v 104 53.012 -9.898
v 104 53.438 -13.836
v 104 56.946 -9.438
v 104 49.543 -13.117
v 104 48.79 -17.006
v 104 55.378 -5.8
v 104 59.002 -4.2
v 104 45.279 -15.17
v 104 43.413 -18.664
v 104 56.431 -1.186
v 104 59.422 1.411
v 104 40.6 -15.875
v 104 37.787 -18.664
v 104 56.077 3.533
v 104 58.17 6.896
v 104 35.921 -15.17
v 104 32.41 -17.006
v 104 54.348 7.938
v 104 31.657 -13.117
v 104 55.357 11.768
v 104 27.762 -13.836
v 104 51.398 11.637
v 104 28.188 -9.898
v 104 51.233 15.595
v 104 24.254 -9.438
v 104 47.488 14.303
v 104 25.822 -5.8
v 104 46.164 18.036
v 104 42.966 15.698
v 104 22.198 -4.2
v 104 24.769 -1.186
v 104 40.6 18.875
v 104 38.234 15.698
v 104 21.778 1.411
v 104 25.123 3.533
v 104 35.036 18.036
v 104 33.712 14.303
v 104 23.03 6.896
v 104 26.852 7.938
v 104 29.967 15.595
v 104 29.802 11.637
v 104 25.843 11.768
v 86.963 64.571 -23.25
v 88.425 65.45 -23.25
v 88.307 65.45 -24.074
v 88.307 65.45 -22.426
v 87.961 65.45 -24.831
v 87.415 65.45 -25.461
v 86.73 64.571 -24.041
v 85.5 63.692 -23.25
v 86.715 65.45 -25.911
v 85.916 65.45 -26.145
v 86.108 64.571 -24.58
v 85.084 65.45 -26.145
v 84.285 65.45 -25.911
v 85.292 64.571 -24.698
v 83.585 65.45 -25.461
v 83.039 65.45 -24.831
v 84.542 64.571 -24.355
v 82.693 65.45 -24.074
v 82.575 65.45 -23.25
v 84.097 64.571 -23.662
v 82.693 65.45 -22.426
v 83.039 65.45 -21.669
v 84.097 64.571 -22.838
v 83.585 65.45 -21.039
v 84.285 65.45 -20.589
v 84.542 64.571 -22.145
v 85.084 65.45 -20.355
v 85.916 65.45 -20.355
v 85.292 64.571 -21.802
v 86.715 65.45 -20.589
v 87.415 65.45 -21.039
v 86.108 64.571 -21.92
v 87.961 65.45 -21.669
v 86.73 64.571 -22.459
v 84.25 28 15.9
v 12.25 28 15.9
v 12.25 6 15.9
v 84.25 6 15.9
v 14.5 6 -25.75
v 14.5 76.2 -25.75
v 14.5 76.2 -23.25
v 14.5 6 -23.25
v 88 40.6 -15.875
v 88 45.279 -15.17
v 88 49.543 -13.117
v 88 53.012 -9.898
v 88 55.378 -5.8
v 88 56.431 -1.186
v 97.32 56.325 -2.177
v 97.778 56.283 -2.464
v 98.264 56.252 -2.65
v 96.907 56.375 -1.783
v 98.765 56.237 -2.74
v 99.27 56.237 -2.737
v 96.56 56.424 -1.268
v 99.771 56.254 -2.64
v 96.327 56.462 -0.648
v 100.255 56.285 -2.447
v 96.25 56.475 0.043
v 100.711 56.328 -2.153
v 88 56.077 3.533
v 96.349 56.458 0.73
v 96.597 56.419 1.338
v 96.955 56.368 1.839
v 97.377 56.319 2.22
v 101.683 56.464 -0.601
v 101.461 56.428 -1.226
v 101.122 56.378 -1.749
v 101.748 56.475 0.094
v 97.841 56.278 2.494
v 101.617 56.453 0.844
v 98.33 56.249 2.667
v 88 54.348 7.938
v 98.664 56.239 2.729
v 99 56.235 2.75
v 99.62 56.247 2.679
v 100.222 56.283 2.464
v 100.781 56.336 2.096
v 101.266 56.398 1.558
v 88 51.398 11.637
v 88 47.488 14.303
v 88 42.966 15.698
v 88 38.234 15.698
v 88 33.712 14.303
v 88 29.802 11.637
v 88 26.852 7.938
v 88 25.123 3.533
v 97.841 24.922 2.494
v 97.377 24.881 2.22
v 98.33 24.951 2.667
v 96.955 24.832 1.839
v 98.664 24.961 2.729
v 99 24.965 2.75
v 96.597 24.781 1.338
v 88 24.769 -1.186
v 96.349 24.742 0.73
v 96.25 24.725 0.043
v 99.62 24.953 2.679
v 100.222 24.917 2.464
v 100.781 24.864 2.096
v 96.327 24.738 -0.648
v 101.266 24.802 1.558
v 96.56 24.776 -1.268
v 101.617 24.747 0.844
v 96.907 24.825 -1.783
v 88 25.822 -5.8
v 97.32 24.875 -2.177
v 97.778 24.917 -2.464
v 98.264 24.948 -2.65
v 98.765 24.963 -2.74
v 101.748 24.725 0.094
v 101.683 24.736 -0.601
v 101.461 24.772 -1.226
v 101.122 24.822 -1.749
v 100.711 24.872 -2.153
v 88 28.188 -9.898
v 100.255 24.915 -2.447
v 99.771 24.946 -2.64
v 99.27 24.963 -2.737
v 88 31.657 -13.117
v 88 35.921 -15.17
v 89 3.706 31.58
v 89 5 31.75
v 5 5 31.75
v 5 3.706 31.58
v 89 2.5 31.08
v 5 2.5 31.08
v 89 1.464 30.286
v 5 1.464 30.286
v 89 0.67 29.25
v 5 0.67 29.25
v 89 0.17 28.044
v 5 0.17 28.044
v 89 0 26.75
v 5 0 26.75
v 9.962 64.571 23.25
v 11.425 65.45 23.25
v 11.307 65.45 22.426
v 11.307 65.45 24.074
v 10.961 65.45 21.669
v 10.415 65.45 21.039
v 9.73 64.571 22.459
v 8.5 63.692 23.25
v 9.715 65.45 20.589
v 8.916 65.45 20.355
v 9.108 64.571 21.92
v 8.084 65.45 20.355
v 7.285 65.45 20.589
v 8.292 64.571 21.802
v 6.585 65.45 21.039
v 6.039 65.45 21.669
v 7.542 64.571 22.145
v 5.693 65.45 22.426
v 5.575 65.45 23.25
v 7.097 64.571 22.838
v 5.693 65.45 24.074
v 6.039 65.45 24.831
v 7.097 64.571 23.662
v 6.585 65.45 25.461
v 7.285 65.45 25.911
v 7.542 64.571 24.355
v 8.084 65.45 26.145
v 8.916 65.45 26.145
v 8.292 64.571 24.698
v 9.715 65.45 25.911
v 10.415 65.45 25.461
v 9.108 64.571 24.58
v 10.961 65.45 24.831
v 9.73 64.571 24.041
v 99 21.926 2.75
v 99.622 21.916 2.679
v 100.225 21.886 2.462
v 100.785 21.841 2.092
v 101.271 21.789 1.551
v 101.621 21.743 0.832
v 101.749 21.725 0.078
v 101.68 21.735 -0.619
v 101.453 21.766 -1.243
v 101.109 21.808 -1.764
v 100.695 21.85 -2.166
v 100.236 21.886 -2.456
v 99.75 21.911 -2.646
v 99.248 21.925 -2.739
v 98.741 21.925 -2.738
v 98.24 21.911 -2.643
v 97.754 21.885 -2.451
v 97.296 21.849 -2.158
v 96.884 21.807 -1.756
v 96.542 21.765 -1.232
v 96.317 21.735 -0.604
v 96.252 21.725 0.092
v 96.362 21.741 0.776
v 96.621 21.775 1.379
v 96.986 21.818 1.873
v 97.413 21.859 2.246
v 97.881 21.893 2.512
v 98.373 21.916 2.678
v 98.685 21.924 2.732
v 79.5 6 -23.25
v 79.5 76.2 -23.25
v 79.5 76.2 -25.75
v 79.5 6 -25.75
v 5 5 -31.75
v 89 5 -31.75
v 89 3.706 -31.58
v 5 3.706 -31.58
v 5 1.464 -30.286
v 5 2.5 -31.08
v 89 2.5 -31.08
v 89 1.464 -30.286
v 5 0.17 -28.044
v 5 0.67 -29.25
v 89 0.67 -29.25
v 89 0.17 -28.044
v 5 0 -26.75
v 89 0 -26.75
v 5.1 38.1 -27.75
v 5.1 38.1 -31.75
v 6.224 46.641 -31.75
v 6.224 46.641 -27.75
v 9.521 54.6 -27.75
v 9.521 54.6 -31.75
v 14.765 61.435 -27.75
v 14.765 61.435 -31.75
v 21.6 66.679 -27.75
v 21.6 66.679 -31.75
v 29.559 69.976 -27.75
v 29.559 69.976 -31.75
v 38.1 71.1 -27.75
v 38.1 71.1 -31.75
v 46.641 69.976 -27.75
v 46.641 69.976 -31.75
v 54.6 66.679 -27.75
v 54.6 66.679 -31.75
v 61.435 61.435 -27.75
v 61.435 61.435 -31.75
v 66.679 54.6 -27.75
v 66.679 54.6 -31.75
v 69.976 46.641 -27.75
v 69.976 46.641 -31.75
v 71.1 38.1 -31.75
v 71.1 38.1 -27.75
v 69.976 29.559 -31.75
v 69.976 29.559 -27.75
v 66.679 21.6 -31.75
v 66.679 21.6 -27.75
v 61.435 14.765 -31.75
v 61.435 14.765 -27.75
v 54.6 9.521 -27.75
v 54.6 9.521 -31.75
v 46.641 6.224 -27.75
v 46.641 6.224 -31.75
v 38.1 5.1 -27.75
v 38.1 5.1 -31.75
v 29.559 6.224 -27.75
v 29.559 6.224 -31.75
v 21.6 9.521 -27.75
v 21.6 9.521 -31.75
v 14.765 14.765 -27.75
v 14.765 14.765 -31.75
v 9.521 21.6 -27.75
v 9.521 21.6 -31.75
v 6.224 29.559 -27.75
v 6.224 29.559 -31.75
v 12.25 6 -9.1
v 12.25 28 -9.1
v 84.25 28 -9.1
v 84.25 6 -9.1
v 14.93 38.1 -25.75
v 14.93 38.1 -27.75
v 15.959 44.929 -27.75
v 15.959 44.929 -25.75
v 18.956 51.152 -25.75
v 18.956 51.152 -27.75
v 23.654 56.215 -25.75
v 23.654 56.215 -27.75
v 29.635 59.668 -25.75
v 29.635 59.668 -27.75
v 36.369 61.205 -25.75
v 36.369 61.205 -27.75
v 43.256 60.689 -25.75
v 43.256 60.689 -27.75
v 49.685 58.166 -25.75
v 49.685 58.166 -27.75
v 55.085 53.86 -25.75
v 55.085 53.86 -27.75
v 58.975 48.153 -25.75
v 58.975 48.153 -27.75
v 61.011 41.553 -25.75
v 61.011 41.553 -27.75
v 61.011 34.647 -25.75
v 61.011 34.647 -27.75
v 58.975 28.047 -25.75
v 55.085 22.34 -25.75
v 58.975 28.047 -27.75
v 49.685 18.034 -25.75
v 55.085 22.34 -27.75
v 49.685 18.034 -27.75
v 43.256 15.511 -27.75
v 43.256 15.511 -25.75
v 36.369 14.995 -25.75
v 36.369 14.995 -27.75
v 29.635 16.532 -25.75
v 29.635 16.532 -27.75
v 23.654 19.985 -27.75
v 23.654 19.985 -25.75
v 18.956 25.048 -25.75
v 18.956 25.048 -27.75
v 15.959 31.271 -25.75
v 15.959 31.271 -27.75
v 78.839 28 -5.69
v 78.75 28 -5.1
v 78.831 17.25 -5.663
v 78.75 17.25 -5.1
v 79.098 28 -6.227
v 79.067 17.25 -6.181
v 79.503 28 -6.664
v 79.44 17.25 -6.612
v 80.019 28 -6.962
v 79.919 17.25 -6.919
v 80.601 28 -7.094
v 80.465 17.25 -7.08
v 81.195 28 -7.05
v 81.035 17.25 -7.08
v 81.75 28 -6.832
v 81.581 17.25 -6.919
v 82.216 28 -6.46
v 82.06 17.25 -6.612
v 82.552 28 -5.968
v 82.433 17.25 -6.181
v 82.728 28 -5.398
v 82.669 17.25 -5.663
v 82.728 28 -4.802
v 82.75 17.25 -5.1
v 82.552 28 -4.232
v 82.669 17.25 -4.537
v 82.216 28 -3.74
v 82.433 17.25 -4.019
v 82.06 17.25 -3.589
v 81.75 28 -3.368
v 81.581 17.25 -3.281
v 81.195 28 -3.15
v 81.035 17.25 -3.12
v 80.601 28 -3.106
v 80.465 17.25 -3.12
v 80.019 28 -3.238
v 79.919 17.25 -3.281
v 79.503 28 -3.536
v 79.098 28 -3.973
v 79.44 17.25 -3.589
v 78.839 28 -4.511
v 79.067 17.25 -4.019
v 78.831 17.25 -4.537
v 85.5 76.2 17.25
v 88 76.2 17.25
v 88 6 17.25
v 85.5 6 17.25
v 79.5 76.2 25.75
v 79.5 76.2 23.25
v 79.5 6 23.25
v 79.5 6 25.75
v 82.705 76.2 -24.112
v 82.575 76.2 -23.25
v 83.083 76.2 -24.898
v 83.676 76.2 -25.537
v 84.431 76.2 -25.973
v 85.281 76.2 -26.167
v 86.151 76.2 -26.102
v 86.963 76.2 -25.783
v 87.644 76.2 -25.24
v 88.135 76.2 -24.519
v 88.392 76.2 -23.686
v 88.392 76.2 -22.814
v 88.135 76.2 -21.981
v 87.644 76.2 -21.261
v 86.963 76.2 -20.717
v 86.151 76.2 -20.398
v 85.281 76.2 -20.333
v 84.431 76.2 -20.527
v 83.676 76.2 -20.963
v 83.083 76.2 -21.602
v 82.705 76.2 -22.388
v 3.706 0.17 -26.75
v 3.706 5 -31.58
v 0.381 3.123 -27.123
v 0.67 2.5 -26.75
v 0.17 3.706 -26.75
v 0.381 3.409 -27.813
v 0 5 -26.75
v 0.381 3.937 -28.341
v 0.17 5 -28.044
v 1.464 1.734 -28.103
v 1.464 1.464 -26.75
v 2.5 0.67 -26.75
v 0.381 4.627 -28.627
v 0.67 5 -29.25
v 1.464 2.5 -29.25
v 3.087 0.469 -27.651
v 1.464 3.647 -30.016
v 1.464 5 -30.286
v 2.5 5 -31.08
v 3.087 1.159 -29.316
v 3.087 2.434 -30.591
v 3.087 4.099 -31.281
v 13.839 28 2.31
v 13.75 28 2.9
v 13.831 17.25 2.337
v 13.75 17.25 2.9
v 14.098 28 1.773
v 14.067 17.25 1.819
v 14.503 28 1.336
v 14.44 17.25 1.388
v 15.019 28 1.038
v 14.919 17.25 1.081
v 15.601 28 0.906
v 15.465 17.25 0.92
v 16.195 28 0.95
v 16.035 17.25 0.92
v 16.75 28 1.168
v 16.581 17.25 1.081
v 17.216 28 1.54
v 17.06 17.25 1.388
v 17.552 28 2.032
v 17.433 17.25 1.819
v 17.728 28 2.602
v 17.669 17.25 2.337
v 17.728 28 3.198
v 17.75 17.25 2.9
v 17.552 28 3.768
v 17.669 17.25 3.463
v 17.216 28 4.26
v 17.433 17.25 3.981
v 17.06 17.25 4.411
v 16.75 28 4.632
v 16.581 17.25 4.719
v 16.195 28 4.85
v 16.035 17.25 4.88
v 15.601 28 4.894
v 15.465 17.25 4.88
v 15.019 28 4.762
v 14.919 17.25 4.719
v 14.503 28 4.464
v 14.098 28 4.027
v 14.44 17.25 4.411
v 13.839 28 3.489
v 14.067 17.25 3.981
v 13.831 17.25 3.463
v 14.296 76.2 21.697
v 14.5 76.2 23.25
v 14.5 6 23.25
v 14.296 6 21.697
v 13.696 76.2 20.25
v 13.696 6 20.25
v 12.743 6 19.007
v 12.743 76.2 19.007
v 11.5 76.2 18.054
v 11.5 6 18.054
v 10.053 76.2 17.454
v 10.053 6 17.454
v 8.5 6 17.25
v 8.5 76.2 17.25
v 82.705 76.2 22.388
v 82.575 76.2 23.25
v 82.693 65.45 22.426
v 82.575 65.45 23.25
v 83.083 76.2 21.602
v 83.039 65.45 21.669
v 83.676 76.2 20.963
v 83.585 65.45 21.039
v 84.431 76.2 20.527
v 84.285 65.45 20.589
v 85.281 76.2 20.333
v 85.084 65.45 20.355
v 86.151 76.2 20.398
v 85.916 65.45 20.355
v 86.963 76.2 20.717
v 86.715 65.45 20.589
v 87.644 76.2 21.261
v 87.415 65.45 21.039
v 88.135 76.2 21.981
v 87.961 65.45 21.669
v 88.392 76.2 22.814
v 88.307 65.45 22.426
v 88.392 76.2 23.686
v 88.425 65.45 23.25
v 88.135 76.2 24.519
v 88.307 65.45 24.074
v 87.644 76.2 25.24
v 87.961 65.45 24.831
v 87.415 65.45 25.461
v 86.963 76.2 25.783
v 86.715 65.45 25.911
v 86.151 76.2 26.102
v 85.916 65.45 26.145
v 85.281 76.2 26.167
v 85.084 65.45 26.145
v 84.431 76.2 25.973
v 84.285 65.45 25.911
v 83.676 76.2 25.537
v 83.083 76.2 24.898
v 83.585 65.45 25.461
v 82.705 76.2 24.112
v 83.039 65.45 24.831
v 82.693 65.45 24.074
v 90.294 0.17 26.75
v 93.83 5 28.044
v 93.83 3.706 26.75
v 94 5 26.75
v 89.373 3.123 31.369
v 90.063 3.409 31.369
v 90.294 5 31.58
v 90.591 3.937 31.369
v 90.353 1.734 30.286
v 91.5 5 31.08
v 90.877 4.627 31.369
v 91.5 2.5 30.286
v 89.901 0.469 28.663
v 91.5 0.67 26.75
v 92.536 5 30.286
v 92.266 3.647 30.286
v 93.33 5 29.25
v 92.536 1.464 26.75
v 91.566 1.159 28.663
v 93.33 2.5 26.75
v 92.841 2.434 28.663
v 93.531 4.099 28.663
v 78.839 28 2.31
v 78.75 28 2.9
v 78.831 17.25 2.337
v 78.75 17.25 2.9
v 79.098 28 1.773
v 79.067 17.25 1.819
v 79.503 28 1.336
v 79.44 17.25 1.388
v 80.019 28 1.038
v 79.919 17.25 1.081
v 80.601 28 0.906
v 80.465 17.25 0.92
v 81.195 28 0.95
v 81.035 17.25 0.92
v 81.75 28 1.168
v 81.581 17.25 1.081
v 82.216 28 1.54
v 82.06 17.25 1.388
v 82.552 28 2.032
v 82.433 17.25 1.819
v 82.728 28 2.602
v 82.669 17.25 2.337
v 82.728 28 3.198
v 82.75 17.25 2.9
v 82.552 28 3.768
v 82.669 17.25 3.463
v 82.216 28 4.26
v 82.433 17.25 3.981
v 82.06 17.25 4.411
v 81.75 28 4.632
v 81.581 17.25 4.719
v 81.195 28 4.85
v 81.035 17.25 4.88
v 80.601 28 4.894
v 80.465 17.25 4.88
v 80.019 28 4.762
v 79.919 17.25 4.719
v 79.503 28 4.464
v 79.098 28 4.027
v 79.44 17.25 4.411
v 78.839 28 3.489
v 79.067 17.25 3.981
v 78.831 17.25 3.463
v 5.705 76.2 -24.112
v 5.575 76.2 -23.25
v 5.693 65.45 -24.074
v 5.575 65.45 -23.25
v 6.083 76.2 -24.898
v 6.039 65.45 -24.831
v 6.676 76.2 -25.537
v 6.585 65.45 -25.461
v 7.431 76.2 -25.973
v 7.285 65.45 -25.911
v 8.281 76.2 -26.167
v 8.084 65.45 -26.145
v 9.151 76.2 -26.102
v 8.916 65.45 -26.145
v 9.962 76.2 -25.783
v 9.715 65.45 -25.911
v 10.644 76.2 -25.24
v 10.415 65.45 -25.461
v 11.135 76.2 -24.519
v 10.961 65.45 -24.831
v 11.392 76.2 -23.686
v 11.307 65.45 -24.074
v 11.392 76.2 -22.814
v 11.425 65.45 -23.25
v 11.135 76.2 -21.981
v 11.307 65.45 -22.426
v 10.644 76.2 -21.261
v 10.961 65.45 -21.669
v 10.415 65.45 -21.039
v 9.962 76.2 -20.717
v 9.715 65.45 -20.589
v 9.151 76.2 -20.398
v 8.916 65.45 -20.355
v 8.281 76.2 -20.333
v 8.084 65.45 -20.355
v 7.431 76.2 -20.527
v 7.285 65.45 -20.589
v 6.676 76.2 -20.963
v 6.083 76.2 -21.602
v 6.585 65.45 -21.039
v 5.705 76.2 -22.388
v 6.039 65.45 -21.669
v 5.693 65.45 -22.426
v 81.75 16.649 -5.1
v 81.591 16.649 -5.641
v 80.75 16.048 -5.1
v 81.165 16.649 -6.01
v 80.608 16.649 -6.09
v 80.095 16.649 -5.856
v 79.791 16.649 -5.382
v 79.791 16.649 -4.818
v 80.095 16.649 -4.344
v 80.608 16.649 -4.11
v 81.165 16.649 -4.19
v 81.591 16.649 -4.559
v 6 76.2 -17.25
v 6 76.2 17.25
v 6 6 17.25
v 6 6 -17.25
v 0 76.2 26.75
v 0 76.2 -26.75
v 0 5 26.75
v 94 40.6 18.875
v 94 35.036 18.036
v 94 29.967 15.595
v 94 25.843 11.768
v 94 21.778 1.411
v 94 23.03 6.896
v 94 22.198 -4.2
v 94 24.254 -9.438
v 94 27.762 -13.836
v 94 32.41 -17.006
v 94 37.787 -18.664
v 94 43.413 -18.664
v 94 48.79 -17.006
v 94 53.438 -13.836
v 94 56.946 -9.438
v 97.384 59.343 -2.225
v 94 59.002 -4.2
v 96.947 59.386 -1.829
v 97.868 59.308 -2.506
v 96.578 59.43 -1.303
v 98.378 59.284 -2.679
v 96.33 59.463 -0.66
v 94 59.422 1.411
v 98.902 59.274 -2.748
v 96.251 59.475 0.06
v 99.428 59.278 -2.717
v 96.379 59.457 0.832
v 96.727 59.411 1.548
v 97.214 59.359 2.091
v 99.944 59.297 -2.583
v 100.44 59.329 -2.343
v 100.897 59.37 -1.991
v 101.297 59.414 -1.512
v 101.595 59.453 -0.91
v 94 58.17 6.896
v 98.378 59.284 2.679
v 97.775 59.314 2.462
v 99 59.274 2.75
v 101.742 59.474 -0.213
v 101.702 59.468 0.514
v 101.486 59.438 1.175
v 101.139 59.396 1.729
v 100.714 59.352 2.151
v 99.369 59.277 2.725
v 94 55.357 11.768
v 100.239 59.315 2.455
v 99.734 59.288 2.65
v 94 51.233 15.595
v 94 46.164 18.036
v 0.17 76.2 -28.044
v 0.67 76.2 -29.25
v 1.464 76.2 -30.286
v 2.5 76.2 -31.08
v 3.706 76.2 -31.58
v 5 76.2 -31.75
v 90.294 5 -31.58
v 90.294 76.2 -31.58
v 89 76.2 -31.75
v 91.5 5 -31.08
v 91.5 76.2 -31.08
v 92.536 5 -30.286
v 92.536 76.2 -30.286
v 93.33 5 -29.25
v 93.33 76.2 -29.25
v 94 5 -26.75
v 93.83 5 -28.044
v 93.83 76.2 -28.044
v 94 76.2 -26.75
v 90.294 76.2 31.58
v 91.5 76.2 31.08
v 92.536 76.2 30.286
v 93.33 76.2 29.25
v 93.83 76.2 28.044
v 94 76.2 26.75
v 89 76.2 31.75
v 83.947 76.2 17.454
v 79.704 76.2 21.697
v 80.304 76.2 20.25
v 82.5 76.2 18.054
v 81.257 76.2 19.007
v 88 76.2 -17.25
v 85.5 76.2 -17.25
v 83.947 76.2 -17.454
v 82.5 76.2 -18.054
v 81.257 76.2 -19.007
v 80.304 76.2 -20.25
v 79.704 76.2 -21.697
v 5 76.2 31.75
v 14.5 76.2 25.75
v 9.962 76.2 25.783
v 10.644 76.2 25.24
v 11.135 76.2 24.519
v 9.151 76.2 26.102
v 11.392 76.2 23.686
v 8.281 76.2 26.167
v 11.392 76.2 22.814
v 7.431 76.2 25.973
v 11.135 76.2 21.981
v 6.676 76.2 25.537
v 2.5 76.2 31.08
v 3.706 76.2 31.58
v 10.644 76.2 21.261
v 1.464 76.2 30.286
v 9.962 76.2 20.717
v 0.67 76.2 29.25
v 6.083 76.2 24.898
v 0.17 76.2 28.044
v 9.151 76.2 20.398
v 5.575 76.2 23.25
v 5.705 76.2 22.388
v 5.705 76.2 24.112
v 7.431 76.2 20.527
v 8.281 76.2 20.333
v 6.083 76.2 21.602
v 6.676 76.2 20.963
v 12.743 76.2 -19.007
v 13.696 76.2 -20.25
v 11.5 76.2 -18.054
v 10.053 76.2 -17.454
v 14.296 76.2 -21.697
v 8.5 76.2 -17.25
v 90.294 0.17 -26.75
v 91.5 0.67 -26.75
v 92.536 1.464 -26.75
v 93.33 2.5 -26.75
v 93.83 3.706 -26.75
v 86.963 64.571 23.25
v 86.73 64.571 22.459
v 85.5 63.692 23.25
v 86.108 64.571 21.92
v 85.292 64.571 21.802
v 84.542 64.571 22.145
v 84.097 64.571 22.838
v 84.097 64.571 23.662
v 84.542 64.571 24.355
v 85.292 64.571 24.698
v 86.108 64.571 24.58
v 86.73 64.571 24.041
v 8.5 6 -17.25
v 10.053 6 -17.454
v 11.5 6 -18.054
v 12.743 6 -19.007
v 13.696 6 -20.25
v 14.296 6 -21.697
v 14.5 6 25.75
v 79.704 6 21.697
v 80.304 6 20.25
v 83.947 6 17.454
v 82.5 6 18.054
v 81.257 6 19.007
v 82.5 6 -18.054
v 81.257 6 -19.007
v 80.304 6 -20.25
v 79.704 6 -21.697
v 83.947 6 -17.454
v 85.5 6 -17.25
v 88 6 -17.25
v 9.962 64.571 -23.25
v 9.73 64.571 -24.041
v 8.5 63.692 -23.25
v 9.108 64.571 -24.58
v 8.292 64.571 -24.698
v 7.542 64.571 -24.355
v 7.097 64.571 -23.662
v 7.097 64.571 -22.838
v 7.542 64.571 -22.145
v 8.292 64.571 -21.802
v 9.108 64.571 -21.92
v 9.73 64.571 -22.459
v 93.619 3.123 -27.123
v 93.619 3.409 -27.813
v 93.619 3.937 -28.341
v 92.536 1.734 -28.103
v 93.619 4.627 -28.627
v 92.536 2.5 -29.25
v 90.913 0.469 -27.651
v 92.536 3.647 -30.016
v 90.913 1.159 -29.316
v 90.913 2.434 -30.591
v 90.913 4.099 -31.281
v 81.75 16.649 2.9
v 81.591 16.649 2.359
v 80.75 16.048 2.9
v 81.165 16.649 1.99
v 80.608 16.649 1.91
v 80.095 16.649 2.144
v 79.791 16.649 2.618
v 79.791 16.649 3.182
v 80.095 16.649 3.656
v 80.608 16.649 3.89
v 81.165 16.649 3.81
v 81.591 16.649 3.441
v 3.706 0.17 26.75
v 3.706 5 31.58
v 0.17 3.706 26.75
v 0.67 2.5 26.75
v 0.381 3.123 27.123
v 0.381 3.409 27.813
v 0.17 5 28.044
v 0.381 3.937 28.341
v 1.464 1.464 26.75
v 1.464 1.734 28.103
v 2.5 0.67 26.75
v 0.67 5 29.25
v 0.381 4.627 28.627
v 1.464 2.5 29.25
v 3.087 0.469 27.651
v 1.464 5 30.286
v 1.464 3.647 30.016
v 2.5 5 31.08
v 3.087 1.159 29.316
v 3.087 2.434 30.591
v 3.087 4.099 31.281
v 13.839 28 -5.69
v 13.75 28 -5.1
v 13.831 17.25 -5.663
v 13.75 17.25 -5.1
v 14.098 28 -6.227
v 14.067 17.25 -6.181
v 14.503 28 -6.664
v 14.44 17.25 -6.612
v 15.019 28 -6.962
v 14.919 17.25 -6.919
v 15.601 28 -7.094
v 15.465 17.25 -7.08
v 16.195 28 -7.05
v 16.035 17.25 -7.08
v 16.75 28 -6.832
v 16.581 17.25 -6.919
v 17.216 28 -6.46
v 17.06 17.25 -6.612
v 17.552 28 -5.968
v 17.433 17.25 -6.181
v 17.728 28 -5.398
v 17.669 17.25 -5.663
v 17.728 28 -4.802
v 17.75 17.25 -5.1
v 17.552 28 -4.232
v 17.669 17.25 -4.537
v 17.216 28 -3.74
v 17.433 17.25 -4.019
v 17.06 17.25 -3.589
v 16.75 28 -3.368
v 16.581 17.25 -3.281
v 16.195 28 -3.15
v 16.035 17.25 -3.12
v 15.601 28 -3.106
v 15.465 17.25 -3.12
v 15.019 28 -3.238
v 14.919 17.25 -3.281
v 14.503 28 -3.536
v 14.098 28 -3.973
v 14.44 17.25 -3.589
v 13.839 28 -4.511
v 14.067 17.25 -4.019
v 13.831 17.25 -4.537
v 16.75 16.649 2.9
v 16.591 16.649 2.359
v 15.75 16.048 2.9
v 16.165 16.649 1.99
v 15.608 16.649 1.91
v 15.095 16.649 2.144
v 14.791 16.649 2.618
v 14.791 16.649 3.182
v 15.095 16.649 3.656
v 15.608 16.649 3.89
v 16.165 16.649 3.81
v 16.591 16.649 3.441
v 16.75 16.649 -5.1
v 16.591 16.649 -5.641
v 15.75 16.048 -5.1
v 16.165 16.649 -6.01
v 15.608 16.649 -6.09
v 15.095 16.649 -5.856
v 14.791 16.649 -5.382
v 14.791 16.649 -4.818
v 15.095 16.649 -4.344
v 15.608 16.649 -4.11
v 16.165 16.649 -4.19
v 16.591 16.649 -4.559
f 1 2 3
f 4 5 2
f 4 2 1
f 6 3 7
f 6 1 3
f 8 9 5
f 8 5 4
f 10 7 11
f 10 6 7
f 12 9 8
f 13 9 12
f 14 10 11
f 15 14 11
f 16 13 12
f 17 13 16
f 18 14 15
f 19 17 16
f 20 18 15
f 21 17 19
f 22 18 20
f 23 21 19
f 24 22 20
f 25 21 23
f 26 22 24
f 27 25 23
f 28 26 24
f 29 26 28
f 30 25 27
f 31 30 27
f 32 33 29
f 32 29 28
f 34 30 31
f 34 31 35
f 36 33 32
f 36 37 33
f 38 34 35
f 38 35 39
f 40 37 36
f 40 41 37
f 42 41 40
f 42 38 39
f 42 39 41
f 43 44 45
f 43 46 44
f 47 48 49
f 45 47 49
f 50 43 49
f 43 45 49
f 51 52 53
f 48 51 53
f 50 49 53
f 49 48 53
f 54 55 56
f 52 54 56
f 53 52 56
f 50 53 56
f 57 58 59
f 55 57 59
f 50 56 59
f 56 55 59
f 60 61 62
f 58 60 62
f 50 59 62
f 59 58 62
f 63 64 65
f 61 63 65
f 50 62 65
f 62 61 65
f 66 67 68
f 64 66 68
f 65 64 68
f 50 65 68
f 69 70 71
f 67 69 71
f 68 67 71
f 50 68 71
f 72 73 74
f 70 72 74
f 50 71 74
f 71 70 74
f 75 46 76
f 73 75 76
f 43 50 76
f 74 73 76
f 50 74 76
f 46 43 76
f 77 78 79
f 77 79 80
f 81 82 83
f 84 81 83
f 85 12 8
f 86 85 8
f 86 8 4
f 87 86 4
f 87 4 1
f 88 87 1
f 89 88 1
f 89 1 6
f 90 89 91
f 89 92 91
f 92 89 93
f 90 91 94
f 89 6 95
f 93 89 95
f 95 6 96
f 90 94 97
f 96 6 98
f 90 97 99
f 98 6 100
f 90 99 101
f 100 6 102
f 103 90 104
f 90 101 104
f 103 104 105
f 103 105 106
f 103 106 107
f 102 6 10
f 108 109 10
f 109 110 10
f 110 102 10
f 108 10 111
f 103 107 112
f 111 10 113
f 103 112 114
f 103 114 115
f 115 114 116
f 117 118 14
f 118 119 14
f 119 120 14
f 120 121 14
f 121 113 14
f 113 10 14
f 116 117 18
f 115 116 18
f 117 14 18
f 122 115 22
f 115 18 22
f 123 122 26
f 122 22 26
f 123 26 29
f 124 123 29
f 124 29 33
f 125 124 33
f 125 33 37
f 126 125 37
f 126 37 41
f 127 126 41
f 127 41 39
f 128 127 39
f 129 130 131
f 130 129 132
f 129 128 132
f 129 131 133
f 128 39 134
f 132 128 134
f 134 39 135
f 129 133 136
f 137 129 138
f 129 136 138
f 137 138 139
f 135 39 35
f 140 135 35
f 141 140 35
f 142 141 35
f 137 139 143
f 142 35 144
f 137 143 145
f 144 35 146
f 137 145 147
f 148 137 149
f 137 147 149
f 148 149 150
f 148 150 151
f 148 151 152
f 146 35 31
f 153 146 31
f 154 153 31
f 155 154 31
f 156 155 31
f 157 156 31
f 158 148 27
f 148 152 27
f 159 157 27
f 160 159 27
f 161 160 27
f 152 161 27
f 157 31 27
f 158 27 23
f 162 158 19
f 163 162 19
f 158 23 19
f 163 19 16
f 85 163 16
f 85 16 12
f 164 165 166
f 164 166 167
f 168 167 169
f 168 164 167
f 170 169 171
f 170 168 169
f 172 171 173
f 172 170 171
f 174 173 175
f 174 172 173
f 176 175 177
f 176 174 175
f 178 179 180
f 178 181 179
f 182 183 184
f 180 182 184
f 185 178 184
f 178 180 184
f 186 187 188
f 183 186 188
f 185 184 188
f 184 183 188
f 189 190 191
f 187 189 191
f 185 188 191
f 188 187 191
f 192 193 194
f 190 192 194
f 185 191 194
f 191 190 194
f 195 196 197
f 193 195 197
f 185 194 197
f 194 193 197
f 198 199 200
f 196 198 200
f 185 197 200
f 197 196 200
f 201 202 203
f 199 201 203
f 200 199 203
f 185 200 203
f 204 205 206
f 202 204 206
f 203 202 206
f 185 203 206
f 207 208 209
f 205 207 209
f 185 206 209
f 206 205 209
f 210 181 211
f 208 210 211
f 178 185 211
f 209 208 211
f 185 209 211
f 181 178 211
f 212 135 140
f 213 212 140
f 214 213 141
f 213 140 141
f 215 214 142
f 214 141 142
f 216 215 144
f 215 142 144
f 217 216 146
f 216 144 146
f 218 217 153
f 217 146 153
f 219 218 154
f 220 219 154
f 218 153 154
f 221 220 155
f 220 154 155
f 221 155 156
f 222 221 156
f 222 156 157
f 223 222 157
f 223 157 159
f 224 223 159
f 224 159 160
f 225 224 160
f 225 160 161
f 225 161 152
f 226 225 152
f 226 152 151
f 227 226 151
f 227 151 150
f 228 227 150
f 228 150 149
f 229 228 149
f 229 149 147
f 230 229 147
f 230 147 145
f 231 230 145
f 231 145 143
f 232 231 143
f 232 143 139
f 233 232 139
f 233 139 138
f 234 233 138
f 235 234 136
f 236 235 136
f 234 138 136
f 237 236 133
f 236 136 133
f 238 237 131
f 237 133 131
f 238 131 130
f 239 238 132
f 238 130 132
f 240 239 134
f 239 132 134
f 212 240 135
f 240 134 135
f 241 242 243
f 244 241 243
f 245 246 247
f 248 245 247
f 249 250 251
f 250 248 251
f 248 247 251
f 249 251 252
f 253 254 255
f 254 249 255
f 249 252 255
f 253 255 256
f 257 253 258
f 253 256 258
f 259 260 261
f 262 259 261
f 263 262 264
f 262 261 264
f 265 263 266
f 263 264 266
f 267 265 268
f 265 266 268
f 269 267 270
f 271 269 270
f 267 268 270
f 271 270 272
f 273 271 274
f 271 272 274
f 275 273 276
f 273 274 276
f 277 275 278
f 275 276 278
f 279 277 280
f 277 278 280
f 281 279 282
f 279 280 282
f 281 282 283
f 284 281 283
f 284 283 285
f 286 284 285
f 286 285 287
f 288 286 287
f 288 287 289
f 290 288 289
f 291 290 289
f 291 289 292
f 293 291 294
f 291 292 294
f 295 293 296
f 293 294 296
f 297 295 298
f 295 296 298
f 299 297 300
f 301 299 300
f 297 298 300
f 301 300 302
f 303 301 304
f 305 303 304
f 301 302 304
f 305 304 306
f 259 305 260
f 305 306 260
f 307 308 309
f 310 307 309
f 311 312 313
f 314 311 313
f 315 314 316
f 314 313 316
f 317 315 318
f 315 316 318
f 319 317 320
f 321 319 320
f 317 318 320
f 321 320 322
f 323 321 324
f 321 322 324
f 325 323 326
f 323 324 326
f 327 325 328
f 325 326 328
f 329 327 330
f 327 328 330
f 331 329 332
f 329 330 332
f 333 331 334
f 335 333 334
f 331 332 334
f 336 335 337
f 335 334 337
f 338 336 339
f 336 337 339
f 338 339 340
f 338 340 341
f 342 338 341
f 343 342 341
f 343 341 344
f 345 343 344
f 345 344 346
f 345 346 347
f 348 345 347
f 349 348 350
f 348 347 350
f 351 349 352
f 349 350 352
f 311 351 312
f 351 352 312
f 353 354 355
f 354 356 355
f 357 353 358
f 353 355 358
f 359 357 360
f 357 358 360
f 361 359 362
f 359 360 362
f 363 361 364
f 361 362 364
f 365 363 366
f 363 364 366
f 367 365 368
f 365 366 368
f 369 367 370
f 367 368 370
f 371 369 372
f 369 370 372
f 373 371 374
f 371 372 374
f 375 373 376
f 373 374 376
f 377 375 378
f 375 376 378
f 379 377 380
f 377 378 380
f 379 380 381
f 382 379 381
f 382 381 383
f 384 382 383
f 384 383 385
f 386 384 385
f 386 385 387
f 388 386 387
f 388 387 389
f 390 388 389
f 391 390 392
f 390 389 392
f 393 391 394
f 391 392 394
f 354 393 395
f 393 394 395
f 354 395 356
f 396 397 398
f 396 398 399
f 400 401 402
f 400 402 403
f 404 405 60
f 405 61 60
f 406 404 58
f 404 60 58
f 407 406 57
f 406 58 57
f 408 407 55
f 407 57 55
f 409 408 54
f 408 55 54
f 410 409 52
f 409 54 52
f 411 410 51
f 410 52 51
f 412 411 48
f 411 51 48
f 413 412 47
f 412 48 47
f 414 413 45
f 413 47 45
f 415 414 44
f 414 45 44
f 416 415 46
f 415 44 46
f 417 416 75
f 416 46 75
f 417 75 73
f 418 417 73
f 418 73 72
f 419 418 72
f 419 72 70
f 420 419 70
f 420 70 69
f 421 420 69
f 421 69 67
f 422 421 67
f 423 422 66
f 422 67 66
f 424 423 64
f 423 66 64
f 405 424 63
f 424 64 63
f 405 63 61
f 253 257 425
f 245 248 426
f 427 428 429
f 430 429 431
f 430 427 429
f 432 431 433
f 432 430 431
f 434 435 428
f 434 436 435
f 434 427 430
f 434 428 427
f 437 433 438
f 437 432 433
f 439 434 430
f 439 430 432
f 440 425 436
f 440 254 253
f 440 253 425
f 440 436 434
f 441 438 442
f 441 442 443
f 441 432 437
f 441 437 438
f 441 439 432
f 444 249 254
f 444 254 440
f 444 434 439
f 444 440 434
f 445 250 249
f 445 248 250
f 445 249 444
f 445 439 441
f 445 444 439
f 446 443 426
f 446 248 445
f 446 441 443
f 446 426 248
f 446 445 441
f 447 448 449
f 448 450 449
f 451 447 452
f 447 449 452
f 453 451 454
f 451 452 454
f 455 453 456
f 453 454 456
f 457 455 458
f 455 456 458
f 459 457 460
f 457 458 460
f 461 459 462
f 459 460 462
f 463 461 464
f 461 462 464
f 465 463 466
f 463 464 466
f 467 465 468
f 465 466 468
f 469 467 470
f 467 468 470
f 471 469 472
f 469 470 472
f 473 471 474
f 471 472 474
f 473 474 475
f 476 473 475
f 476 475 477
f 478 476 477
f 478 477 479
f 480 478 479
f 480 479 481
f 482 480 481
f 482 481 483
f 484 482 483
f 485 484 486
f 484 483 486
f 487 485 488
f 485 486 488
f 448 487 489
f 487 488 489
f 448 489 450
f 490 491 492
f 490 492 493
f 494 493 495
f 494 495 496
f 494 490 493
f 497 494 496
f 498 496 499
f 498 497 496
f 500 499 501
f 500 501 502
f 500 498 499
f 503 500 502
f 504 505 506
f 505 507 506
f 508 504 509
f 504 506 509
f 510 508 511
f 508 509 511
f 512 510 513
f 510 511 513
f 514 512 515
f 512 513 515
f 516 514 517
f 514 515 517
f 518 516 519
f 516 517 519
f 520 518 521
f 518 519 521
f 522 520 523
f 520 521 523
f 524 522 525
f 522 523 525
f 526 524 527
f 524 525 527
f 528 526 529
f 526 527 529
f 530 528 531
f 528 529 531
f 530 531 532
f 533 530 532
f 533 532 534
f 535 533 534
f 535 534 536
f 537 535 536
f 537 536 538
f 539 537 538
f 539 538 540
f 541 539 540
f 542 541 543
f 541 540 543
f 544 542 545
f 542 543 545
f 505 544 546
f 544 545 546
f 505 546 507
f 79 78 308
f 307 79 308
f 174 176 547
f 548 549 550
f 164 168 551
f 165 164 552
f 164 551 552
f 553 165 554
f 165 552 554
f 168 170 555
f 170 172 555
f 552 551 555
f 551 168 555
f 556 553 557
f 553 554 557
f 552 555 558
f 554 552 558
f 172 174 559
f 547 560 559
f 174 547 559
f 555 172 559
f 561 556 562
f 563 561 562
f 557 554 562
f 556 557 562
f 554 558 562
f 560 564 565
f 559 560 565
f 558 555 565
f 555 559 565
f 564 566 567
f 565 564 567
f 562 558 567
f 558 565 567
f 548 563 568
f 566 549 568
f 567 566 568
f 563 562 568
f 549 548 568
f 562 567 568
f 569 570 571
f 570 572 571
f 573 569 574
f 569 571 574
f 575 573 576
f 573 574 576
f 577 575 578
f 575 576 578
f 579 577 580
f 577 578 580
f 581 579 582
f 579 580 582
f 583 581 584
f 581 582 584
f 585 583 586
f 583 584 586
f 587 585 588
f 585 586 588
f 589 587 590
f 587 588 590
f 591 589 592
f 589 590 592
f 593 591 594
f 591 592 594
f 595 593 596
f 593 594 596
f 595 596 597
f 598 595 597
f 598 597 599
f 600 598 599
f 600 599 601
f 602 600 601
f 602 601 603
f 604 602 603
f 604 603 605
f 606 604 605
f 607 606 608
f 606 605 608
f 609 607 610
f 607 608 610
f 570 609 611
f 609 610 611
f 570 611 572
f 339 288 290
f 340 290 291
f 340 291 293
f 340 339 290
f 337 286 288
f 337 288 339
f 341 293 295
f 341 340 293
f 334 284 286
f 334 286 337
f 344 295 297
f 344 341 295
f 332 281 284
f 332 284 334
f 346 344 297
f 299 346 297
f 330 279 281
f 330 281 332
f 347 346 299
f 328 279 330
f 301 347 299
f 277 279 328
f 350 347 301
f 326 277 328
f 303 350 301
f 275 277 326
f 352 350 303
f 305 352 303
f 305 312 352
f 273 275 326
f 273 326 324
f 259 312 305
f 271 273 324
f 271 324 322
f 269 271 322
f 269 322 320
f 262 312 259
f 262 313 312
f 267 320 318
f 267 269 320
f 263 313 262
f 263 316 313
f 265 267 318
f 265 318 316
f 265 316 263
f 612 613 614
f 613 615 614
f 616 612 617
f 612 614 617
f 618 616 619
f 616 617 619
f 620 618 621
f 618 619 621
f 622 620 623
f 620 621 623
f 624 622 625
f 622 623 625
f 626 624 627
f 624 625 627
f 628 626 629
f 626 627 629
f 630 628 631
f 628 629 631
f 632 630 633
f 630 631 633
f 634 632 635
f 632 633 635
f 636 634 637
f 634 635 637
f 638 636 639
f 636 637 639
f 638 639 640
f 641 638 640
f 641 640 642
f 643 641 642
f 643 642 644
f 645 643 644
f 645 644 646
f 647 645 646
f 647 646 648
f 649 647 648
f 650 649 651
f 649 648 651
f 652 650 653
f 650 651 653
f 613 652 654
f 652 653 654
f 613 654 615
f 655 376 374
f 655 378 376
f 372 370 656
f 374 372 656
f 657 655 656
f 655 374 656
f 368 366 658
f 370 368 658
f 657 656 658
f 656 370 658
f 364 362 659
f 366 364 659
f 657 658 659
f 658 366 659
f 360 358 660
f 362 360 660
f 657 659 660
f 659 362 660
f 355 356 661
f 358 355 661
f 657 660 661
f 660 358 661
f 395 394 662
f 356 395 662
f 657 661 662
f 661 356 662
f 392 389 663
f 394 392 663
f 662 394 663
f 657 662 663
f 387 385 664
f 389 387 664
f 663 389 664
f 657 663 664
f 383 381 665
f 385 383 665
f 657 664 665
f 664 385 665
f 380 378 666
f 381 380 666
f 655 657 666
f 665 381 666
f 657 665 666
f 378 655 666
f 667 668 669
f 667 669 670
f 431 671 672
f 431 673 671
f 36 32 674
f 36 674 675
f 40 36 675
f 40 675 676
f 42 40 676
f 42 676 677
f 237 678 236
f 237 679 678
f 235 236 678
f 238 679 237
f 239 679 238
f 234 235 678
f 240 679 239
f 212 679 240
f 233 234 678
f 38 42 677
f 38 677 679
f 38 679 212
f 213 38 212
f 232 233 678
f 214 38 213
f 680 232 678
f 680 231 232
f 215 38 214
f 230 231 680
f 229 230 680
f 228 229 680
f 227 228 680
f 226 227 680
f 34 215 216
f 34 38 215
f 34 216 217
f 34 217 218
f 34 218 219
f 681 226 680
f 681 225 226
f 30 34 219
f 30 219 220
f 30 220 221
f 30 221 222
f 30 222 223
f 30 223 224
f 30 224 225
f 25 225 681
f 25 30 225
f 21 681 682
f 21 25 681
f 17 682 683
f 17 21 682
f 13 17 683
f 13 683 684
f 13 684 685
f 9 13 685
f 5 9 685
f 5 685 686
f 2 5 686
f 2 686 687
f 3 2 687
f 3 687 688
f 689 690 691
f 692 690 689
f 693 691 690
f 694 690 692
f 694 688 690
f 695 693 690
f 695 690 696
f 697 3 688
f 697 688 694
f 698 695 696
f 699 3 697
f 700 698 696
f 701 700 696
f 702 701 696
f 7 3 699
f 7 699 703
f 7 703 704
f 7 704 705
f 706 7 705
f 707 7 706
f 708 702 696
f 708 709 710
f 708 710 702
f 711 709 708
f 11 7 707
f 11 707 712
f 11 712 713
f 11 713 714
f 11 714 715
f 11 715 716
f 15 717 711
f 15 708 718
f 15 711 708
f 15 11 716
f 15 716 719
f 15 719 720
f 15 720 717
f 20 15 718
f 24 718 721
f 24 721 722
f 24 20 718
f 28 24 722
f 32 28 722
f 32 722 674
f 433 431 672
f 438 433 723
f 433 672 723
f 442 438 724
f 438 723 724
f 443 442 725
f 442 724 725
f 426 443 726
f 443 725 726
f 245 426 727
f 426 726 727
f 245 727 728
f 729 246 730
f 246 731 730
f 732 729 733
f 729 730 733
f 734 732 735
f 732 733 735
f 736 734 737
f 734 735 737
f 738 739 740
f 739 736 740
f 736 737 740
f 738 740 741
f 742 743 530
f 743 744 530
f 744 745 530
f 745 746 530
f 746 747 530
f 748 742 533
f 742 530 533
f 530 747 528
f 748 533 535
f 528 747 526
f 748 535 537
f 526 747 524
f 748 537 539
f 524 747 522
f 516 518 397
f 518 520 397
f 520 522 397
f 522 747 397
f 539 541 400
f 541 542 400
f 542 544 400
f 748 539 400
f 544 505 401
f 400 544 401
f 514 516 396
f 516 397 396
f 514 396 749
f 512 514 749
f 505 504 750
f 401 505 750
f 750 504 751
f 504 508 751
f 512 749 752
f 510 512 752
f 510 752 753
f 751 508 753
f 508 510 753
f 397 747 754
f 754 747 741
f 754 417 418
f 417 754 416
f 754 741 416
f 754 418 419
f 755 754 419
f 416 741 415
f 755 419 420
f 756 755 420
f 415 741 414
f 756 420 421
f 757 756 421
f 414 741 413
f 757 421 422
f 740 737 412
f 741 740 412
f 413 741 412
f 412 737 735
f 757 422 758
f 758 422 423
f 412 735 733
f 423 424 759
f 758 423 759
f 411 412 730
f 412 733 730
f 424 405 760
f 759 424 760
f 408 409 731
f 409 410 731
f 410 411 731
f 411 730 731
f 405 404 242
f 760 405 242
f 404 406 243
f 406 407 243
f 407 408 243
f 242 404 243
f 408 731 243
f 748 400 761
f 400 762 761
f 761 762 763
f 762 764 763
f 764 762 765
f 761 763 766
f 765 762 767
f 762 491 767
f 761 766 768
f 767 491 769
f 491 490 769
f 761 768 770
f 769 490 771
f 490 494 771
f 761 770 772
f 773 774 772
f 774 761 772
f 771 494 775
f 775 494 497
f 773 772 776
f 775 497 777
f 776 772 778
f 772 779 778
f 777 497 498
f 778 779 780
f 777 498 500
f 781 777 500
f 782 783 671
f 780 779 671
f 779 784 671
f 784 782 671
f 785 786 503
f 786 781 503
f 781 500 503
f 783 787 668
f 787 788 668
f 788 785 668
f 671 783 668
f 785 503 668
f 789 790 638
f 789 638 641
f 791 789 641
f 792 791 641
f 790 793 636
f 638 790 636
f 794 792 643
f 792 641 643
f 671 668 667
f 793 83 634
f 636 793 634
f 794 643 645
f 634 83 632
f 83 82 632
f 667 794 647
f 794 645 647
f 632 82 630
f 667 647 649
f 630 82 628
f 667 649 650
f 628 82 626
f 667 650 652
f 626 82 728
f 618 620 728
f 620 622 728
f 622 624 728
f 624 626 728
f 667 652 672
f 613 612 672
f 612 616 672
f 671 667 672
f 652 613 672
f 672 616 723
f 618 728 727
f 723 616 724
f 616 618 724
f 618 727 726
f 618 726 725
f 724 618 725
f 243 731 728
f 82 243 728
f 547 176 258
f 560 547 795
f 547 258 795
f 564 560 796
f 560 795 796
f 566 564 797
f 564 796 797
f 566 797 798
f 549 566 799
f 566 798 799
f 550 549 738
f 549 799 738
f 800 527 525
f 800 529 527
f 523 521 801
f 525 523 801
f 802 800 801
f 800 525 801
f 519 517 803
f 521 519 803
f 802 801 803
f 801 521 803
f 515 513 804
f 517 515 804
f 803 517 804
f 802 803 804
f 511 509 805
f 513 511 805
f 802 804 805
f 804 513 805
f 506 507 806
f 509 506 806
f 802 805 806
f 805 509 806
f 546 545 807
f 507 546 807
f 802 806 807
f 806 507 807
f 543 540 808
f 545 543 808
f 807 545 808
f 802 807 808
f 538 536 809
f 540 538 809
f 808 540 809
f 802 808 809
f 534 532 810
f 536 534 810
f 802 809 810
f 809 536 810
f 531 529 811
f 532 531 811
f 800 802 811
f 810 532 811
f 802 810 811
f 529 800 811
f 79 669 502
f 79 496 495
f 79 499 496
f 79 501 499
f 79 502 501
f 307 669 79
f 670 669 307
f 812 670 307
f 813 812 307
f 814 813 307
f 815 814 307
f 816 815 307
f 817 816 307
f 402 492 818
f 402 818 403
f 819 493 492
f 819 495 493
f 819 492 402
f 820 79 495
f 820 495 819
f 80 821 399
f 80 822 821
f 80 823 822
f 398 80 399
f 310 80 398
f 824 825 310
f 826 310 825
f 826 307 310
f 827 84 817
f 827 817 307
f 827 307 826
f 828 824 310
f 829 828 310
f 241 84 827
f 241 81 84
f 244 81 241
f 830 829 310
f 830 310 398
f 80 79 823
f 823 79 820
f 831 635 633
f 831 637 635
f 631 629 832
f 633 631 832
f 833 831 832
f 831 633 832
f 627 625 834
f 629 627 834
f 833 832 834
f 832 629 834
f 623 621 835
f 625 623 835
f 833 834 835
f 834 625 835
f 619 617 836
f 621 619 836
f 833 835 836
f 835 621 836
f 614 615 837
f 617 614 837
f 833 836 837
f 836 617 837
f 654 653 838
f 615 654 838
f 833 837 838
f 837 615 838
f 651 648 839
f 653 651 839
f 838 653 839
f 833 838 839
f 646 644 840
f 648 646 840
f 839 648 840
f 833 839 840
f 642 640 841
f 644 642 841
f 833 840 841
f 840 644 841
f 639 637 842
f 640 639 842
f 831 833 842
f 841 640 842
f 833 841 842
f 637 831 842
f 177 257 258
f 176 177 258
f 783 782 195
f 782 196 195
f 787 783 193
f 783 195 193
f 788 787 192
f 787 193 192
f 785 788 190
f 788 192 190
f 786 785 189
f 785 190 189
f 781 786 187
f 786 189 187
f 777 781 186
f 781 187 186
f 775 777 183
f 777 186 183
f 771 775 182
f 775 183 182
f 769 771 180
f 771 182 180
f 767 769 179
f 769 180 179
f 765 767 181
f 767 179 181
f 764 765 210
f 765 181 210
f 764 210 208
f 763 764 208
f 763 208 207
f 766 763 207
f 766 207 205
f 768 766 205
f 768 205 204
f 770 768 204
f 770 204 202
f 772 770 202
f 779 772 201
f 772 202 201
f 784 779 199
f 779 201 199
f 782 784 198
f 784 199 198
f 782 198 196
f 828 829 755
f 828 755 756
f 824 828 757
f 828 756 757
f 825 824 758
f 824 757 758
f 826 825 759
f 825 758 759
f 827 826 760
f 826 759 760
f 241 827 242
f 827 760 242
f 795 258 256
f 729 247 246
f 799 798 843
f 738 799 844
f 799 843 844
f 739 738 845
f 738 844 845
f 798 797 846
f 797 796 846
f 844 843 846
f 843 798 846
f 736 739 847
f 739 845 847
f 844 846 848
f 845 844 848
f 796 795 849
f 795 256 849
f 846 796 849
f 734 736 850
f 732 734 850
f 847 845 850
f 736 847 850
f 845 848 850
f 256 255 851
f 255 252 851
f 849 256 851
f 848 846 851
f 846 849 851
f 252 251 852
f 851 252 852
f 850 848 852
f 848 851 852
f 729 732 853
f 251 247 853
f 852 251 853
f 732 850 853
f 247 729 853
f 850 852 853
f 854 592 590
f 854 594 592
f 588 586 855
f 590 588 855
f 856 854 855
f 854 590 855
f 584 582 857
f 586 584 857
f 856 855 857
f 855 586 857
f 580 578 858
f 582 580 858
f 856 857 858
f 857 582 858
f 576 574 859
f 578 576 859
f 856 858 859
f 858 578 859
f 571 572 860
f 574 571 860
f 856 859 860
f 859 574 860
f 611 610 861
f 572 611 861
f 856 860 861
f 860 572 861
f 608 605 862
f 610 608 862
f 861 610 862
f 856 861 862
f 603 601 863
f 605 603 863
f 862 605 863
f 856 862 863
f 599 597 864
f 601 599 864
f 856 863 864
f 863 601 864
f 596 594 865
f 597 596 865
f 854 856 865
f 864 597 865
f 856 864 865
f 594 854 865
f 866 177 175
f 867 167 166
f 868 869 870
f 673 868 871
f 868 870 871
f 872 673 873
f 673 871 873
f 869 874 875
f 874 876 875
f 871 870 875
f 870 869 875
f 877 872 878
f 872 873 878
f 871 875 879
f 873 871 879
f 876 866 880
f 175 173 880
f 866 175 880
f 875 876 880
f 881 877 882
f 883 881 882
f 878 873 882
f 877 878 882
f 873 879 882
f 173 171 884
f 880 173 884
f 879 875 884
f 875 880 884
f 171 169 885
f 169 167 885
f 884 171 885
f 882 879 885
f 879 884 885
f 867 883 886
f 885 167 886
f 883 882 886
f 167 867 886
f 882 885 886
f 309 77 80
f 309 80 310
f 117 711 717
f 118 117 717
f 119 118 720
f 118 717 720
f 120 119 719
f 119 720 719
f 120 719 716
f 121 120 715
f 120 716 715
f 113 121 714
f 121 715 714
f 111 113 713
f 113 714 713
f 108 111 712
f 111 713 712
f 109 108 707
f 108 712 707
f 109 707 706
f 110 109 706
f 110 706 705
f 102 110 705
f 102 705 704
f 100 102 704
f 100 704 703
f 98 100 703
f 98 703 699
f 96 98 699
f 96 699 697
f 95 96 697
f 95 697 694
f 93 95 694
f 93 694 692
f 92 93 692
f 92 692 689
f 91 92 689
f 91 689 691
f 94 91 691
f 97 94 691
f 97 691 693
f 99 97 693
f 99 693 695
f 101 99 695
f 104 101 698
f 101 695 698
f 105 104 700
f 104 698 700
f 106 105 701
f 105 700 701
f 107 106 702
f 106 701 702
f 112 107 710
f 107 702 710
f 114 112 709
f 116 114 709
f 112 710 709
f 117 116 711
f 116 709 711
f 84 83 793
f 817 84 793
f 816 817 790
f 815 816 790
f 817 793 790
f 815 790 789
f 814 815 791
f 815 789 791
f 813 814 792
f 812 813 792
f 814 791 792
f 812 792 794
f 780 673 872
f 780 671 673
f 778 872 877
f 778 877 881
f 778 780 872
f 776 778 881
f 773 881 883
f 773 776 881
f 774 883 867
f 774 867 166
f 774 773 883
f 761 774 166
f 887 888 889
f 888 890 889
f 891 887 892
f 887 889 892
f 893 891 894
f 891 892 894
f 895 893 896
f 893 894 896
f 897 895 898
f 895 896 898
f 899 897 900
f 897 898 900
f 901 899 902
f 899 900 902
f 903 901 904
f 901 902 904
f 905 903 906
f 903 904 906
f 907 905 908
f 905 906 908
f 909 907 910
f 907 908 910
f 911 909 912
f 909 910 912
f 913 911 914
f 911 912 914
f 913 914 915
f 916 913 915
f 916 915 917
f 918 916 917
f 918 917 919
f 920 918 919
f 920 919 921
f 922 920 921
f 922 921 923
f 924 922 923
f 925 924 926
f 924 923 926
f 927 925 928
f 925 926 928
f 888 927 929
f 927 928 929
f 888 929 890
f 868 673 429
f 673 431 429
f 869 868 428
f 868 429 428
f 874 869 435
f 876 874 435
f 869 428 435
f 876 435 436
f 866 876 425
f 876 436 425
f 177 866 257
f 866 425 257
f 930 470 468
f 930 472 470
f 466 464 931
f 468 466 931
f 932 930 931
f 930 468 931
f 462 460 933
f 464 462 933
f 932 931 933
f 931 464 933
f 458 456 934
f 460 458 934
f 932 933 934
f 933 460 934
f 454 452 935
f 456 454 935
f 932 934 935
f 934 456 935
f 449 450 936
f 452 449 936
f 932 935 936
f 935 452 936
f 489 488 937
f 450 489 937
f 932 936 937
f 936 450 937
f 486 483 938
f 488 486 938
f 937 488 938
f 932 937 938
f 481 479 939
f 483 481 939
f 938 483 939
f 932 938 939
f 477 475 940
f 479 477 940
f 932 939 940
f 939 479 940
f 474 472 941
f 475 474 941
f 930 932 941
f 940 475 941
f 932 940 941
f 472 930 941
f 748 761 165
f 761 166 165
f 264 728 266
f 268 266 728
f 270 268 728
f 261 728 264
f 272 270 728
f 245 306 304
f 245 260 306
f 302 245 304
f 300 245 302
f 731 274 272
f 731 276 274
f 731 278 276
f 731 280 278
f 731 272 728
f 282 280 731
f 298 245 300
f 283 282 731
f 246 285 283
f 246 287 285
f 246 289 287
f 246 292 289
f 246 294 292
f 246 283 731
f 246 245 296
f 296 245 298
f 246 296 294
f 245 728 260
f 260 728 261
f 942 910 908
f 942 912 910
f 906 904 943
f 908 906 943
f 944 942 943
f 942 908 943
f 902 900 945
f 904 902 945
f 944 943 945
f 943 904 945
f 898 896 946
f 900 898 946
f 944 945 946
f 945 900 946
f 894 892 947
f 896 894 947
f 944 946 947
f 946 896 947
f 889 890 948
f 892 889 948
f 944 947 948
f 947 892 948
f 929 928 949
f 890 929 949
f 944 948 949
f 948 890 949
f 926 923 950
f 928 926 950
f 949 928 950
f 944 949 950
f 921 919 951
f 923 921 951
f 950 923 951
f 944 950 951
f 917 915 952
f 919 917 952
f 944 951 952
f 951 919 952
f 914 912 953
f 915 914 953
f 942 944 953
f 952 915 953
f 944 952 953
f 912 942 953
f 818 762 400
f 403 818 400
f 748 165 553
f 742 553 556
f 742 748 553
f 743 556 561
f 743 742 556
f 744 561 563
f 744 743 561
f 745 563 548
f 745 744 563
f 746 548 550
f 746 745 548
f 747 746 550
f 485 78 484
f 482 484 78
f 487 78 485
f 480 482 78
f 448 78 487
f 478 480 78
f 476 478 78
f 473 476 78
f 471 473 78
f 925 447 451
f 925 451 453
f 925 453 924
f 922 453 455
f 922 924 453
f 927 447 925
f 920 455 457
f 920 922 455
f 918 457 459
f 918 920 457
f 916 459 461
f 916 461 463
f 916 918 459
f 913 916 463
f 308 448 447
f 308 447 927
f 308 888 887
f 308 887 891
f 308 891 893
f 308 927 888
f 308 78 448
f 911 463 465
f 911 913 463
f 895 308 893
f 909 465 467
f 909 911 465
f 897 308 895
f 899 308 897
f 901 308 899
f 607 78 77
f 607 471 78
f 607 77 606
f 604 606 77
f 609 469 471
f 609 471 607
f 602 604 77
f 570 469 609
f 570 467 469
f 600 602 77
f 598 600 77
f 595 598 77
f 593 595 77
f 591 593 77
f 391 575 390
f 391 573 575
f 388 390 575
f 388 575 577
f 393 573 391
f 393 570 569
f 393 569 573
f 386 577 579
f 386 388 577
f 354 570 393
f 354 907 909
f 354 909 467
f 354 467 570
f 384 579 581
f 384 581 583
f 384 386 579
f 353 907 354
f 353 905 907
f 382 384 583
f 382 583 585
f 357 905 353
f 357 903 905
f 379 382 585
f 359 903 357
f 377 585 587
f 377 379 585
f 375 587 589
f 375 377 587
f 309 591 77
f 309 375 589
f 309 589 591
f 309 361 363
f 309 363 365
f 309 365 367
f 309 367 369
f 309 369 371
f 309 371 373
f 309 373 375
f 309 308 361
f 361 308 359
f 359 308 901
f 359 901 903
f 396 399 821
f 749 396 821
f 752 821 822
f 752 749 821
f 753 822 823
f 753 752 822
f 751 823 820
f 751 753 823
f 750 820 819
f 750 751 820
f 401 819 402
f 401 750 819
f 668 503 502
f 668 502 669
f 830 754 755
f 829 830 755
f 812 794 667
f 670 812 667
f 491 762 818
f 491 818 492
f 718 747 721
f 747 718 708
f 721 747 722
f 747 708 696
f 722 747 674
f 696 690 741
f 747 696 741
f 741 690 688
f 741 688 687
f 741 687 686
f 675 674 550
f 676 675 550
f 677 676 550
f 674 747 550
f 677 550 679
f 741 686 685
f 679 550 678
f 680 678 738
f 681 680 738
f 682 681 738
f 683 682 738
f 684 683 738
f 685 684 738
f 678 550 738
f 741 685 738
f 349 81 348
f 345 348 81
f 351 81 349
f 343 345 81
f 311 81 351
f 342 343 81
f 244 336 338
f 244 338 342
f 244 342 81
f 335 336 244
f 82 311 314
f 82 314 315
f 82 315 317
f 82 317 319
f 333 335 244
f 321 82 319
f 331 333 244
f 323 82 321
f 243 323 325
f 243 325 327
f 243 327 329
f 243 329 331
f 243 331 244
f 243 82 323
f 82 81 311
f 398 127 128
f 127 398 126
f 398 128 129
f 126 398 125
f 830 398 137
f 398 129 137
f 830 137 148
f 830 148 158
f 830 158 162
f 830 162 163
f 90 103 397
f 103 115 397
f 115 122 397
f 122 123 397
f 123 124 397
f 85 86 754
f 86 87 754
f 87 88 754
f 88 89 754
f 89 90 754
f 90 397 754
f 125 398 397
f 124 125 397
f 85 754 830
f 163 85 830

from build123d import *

# Parameters (mm, degrees)
SKETCH1_W                 = 94
SKETCH1_H                 = 63.5
BOSS_EXTRUDE1_DEPTH       = 76.2
SKETCH2_W                 = 82.000024
SKETCH2_H                 = 51.500024
CUT_EXTRUDE1_DEPTH        = 70.2
SKETCH7_R                 = 33
CUT_EXTRUDE4_DEPTH        = 4
SKETCH8_R                 = 12.55
CUT_EXTRUDE5_DEPTH        = 2
SKETCH15_W                = 72
SKETCH15_H                = 25
BOSS_EXTRUDE3_DEPTH       = 22
FILLET1_R                 = 5
BOSS_EXTRUDE4_DEPTH       = 70.2
F_1_0MM_DOWEL_HOLE2_D     = 5.85
F_1_0MM_DOWEL_HOLE2_DEPTH = 10.75
F_1_0MM_DOWEL_HOLE2_TIP   = 1.757517311
SKETCH49_R                = 15.875
CUT_EXTRUDE7_DEPTH        = 5.999988
BOSS_EXTRUDE5_START       = 10
SKETCH51_R                = 18.875
SKETCH51_R_2              = 15.875
BOSS_EXTRUDE5_DEPTH       = 10
SKETCH52_R                = 2.75
CUT_EXTRUDE8_DEPTH        = 124.940865436
SKETCH53_R                = 23.17
CUT_EXTRUDE9_DEPTH        = 1.999988
BRACKET_HOLES_D           = 4
BRACKET_HOLES_DEPTH       = 10.75
BRACKET_HOLES_TIP         = 1.201721238


with BuildPart() as part:
    # Sketch1 → Boss-Extrude1 (new body)
    with BuildSketch(Plane(origin=(0, 0, 0), x_dir=(1, 0, 0), z_dir=(0, 1, 0))):
        with Locations((47, 0)):
            Rectangle(SKETCH1_W, SKETCH1_H)
    extrude(amount=BOSS_EXTRUDE1_DEPTH)

    # Sketch2 → Cut-Extrude1 (cut)
    with BuildSketch(Plane(origin=(0, 76.2, 0), x_dir=(1, 0, 0), z_dir=(0, 1, 0))):
        with Locations((47, 0)):
            Rectangle(SKETCH2_W, SKETCH2_H)
    extrude(amount=-CUT_EXTRUDE1_DEPTH, mode=Mode.SUBTRACT)

    # Sketch7 → Cut-Extrude4 (cut)
    with BuildSketch(Plane(origin=(0, 0, -31.75), x_dir=(-1, 0, 0), z_dir=(0, 0, -1))):
        with Locations((-38.1, 38.1)):
            Circle(SKETCH7_R)
    extrude(amount=-CUT_EXTRUDE4_DEPTH, mode=Mode.SUBTRACT)

    # Sketch8 → Cut-Extrude5 (cut)
    with BuildSketch(Plane.XY.offset(-25.750012)):
        with Locations((38.1, 38.1)):
            Circle(SKETCH8_R)
    extrude(amount=-CUT_EXTRUDE5_DEPTH, mode=Mode.SUBTRACT)

    # Sketch15 → Boss-Extrude3 (add)
    with BuildSketch(Plane(origin=(0, 28, 0), x_dir=(1, 0, 0), z_dir=(0, 1, 0))):
        with Locations((48.25, -3.399988)):
            Rectangle(SKETCH15_W, SKETCH15_H)
    extrude(amount=-BOSS_EXTRUDE3_DEPTH)

    # Fillet1
    fillet1_edges = [part.edges().sort_by_distance(p)[0] for p in [
        (47, 0, -31.75),
        (94, 0, 0),
        (47, 0, 31.75),
        (0, 0, 0),
        (0, 38.1, -31.75),
        (94, 38.1, -31.75),
        (94, 38.1, 31.75),
        (0, 38.1, 31.75),
    ]]
    fillet(fillet1_edges, radius=FILLET1_R)

    # Sketch44 → Boss-Extrude4 (add)
    with BuildSketch(Plane(origin=(0, 76.2, 0), x_dir=(1, 0, 0), z_dir=(0, 1, 0))):
        with BuildLine():
            Line((8.499988, 17.250012), (5.999988, 17.250012))
            Line((5.999988, 17.250012), (5.999988, 25.750012))
            Line((5.999988, 25.750012), (14.499988, 25.750012))
            Line((14.499988, 25.750012), (14.499988, 23.250012))
            ThreePointArc((14.499988, 23.250012), (12.742628687, 19.007371313), (8.499988, 17.250012))
        make_face()
        with BuildLine():
            Line((8.499988, -17.250012), (5.999988, -17.250012))
            Line((5.999988, -17.250012), (5.999988, -25.750012))
            Line((5.999988, -25.750012), (14.499988, -25.750012))
            Line((14.499988, -25.750012), (14.499988, -23.250012))
            ThreePointArc((14.499988, -23.250012), (12.742628687, -19.007371313), (8.499988, -17.250012))
        make_face()
        with BuildLine():
            Line((79.500012, -23.250012), (79.500012, -25.750012))
            Line((79.500012, -25.750012), (88.000012, -25.750012))
            Line((88.000012, -25.750012), (88.000012, -17.250012))
            Line((88.000012, -17.250012), (85.500012, -17.250012))
            ThreePointArc((85.500012, -17.250012), (81.257371313, -19.007371313), (79.500012, -23.250012))
        make_face()
        with BuildLine():
            Line((79.500012, 23.250012), (79.500012, 25.750012))
            Line((79.500012, 25.750012), (88.000012, 25.750012))
            Line((88.000012, 25.750012), (88.000012, 17.250012))
            Line((88.000012, 17.250012), (85.500012, 17.250012))
            ThreePointArc((85.500012, 17.250012), (81.257371313, 19.007371313), (79.500012, 23.250012))
        make_face()
    extrude(amount=-BOSS_EXTRUDE4_DEPTH)

    # Ø1.0mm Dowel Hole2
    with Locations(Plane(origin=(0, 76.2, 0), x_dir=(1, 0, 0), z_dir=(0, 1, 0))):
        with Locations((8.499988, 23.250012), (8.499988, -23.250012), (85.500012, -23.250012), (85.500012, 23.250012)):
            Hole(F_1_0MM_DOWEL_HOLE2_D / 2, depth=F_1_0MM_DOWEL_HOLE2_DEPTH)
            with Locations((0, 0, -(F_1_0MM_DOWEL_HOLE2_DEPTH + F_1_0MM_DOWEL_HOLE2_TIP / 2))):  # 118° drill point
                Cone(0, F_1_0MM_DOWEL_HOLE2_D / 2, F_1_0MM_DOWEL_HOLE2_TIP, mode=Mode.SUBTRACT)

    # Sketch49 → Cut-Extrude7 (cut)
    with BuildSketch(Plane(origin=(94, 0, 0), x_dir=(0, 0, -1), z_dir=(1, 0, 0))):
        with Locations((0, 40.6)):
            Circle(SKETCH49_R)
    extrude(amount=-CUT_EXTRUDE7_DEPTH, mode=Mode.SUBTRACT)

    # Sketch51 → Boss-Extrude5 (add)
    with BuildSketch(Plane(origin=(94, 0, 0), x_dir=(0, 0, -1), z_dir=(1, 0, 0)).offset(BOSS_EXTRUDE5_START)):
        with Locations(Location((0, 40.6, 0), (0, 0, 180))):
            Circle(SKETCH51_R)
        with Locations((0, 40.6)):
            Circle(SKETCH51_R_2, mode=Mode.SUBTRACT)
    extrude(amount=-BOSS_EXTRUDE5_DEPTH)

    # Sketch52 → Cut-Extrude8 (cut, through all)
    with BuildSketch(Plane(origin=(0, 59.475, 0), x_dir=(-1, 0, 0), z_dir=(0, 1, 0))):
        with Locations(Location((-99, 0, 0), (0, 0, 90))):
            Circle(SKETCH52_R)
    extrude(amount=-CUT_EXTRUDE8_DEPTH, mode=Mode.SUBTRACT)

    # Sketch53 → Cut-Extrude9 (cut)
    with BuildSketch(Plane(origin=(0, 0, -27.75), x_dir=(-1, 0, 0), z_dir=(0, 0, -1))):
        with Locations((-38.1, 38.1)):
            Circle(SKETCH53_R)
    extrude(amount=-CUT_EXTRUDE9_DEPTH, mode=Mode.SUBTRACT)

    # Bracket Holes
    with Locations(Plane(origin=(0, 28, 0), x_dir=(1, 0, 0), z_dir=(0, 1, 0))):
        with Locations((15.75, 5.100012), (15.75, -2.899988), (80.75, -2.899988), (80.75, 5.100012)):
            Hole(BRACKET_HOLES_D / 2, depth=BRACKET_HOLES_DEPTH)
            with Locations((0, 0, -(BRACKET_HOLES_DEPTH + BRACKET_HOLES_TIP / 2))):  # 118° drill point
                Cone(0, BRACKET_HOLES_D / 2, BRACKET_HOLES_TIP, mode=Mode.SUBTRACT)


solid = part.part
